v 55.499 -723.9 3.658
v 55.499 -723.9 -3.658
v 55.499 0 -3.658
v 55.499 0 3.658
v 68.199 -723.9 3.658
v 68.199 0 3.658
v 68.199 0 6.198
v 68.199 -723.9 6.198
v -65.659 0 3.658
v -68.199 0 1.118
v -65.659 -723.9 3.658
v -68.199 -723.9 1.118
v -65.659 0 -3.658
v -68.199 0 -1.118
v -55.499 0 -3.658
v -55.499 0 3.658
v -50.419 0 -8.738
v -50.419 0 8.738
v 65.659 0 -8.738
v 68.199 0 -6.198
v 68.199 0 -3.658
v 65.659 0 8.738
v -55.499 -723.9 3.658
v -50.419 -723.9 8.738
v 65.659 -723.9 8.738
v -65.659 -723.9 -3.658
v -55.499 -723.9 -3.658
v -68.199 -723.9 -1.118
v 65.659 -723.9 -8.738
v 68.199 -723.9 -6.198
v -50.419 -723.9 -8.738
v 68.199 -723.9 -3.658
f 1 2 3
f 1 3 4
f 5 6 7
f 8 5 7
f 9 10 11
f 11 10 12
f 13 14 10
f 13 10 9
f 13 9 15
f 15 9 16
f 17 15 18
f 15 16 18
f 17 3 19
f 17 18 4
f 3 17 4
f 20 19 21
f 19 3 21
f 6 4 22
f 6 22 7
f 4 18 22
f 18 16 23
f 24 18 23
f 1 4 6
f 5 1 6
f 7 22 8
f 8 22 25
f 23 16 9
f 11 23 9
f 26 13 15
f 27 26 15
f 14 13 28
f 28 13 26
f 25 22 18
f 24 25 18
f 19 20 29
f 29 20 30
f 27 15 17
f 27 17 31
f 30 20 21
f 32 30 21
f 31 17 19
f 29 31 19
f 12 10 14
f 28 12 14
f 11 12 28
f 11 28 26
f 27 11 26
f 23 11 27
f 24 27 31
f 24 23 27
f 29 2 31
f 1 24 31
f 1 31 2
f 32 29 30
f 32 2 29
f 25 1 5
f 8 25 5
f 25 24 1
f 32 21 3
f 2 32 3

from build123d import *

# Parameters (mm, degrees)
F1_DEPTH = 723.9
F2_SIZE  = 2.54
F3_SIZE  = 5.07999


# Not quite as in the source:
# - a fillet or chamfer is up to 0.001 mm smaller than in the source, because OpenCascade refuses the exact size


with BuildPart() as f1:
    # F0 (on Front) → F1 (new body)
    with BuildSketch(Plane.XZ):
        Polygon((68.199, 3.6576), (68.199, 8.7376), (-55.499, 8.7376), (-55.499, 3.6576), (-68.199, 3.6576), (-68.199, -3.6576), (-55.499, -3.6576), (-55.499, -8.7376), (68.199, -8.7376), (68.199, -3.6576), (55.499, -3.6576), (55.499, 3.6576), align=None)
    extrude(amount=F1_DEPTH)

    # F2
    f2_edges = [f1.edges().sort_by_distance(p)[0] for p in [
        (68.199, -361.95, 8.7376),
        (68.199, -361.95, -8.7376),
        (-68.199, -361.95, 3.6576),
        (-68.199, -361.95, -3.6576),
    ]]
    chamfer(f2_edges, length=F2_SIZE)

    # F3 (size 5.08 in the source; OpenCascade refuses exactly that, so slightly less here)
    f3_edges = [f1.edges().sort_by_distance(p)[0] for p in [
        (-55.499, -361.95, 8.7376),
        (-55.499, -361.95, -8.7376),
    ]]
    chamfer(f3_edges, length=F3_SIZE)


solid = f1.part
